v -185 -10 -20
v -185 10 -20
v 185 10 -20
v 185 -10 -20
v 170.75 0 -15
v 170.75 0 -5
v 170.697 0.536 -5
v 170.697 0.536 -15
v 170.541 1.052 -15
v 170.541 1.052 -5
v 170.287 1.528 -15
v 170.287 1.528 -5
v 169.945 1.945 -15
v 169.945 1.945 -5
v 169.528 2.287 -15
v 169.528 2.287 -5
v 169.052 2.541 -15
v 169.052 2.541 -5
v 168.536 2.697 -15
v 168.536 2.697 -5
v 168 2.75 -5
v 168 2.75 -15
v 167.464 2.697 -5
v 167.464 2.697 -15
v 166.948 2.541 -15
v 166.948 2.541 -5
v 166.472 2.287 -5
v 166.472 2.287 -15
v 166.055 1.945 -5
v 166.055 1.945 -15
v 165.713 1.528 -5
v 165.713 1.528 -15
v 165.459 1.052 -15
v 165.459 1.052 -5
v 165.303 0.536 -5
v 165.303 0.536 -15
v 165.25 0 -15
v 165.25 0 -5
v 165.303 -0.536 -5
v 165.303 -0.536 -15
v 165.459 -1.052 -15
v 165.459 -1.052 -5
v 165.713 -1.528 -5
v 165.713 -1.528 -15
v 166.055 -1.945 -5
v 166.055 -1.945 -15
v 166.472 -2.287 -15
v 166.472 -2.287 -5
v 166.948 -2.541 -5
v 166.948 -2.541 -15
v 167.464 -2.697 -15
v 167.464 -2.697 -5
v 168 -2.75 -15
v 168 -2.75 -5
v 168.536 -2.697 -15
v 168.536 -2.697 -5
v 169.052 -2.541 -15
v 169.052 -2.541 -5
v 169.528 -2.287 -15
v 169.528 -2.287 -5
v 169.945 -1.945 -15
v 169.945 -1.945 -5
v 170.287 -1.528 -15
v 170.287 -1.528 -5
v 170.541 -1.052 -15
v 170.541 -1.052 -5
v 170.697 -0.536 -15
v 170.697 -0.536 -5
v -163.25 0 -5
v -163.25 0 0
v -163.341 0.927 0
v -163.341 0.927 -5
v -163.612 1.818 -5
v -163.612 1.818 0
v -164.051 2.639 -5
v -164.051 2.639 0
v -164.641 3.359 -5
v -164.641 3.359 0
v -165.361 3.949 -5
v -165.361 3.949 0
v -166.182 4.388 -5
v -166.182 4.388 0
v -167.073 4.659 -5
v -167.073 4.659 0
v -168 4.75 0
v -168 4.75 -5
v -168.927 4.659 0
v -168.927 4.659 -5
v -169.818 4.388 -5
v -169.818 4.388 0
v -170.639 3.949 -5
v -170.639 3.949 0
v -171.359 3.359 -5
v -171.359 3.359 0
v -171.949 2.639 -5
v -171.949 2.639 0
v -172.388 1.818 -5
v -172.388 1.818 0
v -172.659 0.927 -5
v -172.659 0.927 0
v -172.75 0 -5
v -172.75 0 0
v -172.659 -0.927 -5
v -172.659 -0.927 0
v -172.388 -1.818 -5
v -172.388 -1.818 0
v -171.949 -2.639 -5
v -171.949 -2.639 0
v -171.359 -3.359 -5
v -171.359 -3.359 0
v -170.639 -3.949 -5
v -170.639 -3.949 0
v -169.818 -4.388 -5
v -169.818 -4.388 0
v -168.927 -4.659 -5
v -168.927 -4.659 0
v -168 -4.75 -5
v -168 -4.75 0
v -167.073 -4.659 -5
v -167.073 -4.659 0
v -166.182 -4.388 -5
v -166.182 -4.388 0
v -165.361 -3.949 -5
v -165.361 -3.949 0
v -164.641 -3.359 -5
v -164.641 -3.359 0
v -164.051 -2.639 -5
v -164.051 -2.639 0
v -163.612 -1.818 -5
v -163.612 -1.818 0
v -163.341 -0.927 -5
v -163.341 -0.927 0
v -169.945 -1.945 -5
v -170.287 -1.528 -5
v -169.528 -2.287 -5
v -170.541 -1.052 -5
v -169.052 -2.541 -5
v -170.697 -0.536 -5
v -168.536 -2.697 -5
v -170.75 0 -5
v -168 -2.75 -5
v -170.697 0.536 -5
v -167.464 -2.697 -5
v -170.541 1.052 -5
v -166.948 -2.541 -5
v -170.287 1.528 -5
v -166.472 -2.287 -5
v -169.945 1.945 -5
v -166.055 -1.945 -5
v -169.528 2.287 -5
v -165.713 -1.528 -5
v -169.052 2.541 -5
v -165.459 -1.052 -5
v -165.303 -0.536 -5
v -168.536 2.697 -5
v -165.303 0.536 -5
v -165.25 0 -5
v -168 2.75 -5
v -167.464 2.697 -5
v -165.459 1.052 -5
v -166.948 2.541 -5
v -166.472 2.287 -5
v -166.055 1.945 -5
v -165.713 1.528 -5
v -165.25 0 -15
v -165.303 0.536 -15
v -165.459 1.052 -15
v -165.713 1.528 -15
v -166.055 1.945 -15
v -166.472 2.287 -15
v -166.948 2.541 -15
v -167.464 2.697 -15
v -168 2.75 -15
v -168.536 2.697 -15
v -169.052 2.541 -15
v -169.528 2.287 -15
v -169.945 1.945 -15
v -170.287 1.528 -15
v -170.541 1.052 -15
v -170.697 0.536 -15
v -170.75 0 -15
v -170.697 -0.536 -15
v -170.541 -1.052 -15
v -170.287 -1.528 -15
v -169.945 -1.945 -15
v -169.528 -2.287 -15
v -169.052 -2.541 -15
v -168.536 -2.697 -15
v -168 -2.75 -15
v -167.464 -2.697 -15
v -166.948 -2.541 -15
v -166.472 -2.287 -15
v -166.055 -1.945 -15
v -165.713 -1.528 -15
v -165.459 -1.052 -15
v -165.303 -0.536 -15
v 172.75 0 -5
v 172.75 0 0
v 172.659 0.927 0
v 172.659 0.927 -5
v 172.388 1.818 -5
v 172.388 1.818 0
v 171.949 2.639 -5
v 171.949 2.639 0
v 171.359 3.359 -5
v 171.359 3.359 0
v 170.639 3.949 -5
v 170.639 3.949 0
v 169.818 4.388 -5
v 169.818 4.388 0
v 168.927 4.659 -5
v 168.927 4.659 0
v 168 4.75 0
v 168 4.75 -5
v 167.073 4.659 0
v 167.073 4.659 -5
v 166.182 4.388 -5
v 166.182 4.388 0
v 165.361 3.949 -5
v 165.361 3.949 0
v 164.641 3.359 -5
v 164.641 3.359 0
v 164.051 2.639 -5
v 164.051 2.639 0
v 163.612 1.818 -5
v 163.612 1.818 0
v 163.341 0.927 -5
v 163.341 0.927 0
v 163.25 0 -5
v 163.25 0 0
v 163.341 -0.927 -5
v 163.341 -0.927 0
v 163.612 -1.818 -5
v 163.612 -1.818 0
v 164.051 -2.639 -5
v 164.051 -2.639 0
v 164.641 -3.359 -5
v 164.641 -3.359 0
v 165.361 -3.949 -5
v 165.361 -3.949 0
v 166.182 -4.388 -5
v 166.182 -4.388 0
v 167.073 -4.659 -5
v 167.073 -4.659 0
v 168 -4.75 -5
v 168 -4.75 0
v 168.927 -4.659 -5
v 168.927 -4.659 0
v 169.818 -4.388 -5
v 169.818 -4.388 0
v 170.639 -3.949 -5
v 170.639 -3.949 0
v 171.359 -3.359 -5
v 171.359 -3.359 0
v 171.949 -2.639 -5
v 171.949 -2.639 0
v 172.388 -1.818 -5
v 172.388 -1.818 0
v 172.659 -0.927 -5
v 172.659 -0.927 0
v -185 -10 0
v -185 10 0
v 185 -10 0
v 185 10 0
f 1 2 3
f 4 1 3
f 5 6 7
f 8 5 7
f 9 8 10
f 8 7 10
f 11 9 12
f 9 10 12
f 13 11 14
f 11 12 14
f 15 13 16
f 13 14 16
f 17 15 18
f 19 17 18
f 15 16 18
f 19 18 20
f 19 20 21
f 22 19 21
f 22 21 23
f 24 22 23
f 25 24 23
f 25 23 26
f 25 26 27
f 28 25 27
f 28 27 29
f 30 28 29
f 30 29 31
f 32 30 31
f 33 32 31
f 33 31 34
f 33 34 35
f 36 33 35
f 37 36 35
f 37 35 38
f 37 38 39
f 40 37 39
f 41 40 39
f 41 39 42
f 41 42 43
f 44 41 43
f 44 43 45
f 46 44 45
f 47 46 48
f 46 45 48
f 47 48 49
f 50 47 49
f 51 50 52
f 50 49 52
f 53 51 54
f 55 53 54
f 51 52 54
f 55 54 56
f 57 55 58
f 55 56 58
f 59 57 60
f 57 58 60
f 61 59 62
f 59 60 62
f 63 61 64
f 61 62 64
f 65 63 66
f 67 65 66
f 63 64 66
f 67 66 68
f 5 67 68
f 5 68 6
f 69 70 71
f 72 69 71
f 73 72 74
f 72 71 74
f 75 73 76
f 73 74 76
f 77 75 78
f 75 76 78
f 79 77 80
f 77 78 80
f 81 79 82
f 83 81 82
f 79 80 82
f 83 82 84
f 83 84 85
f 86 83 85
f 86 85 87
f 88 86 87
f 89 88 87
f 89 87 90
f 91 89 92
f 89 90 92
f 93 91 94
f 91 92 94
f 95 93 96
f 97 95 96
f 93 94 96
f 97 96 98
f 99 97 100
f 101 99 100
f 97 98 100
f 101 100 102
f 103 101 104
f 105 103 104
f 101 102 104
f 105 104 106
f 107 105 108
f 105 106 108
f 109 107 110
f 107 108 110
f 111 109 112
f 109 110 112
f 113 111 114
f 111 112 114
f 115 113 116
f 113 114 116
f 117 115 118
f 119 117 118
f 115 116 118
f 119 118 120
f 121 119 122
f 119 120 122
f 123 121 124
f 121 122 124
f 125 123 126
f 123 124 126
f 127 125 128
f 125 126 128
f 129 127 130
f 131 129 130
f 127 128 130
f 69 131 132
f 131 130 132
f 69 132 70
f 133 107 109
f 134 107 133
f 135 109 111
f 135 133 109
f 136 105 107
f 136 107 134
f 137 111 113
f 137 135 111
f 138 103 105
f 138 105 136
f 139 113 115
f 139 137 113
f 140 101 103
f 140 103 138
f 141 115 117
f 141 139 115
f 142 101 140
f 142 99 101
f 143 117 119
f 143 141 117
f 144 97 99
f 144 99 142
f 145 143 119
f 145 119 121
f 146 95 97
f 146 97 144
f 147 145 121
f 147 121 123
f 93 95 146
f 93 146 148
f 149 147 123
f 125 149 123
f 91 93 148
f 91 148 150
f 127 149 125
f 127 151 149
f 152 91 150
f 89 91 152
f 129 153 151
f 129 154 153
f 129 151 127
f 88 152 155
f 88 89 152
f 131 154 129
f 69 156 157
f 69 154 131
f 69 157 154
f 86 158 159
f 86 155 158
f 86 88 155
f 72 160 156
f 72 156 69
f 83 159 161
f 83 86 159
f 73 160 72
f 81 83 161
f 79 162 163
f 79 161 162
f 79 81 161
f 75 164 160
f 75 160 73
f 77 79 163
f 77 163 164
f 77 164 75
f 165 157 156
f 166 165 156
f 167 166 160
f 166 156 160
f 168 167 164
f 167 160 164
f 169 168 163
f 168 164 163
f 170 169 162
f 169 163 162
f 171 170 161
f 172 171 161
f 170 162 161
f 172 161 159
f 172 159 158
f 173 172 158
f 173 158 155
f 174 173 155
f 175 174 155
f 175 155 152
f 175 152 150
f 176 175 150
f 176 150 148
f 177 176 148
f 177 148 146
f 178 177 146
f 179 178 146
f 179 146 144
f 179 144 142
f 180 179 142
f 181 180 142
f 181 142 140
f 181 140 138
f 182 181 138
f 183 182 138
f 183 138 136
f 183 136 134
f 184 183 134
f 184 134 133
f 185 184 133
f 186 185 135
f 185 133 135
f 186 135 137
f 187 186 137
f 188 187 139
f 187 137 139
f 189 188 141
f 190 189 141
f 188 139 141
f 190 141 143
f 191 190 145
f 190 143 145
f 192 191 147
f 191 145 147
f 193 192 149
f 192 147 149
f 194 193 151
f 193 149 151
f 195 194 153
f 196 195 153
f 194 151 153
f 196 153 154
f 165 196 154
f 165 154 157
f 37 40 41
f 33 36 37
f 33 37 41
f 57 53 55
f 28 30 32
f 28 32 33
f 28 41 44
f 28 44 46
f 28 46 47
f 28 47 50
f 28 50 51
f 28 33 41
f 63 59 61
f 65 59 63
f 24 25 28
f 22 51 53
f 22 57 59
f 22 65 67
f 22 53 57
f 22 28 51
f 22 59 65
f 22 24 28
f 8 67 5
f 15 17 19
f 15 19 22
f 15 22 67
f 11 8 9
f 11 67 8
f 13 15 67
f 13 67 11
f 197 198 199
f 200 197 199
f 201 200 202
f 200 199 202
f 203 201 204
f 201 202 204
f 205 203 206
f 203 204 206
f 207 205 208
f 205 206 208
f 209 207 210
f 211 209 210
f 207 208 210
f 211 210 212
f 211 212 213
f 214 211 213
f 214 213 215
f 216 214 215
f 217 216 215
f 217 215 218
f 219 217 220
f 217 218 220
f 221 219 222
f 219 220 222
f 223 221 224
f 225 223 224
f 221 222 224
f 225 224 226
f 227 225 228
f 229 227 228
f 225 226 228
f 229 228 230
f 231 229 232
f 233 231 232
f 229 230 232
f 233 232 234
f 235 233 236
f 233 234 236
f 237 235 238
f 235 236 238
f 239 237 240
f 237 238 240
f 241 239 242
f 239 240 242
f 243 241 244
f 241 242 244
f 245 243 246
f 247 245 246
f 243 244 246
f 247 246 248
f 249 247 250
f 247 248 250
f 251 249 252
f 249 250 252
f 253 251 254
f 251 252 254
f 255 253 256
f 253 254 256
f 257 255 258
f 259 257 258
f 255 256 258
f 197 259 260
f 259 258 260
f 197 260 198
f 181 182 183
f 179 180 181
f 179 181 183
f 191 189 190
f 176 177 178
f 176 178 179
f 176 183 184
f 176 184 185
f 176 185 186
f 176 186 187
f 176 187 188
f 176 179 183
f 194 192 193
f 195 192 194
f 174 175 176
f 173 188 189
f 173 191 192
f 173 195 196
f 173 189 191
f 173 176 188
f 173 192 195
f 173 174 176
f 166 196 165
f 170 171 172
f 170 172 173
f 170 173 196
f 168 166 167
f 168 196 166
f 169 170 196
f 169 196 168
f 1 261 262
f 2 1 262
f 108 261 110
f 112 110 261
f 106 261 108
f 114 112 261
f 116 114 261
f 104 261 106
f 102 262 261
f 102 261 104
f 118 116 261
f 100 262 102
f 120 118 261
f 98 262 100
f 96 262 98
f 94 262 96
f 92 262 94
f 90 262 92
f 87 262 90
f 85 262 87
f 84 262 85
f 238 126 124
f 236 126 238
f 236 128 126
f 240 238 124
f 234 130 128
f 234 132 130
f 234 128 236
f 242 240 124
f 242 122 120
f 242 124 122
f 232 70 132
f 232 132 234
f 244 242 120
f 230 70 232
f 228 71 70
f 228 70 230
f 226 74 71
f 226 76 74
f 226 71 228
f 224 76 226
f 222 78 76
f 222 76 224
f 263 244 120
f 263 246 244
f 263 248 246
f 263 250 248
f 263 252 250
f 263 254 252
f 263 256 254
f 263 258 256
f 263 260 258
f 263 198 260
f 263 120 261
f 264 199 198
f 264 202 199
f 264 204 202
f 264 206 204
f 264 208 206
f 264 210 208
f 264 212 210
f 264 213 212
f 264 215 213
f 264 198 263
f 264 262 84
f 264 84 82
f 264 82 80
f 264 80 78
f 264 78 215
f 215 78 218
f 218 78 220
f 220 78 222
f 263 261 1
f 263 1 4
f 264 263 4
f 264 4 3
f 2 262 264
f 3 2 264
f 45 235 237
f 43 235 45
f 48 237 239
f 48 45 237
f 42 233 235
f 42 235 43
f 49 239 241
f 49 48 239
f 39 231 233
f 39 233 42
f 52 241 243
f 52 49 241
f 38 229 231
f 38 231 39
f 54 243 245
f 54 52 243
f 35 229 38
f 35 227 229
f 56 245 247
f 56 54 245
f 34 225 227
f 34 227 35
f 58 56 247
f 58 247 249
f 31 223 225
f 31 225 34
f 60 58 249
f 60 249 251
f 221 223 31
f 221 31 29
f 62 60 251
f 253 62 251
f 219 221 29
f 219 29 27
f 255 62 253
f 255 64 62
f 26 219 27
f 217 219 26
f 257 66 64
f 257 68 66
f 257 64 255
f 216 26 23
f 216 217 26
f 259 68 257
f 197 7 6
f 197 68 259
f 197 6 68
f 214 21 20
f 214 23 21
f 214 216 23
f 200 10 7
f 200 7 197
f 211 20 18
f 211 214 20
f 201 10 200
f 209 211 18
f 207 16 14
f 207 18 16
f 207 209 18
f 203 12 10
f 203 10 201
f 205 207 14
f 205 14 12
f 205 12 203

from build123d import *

# Parameters (mm, degrees)
SKETCH_W        = 370
SKETCH_H        = 20
PAD_DEPTH       = 20
SKETCH001_R     = 4.75
POCKET_DEPTH    = 5
SKETCH002_R     = 2.75
POCKET001_DEPTH = 15


with BuildPart() as part:
    # Sketch → Pad (new body)
    with BuildSketch(Plane.XY):
        Rectangle(SKETCH_W, SKETCH_H)
    extrude(amount=-PAD_DEPTH)

    # Sketch001 (on Face5 of Pad) → Pocket (cut)
    with BuildSketch(Plane.XY):
        with Locations((168, 0)):
            Circle(SKETCH001_R)
        with Locations((-168, 0)):
            Circle(SKETCH001_R)
    extrude(amount=-POCKET_DEPTH, mode=Mode.SUBTRACT)

    # Sketch002 (on Face4 of Pocket) → Pocket001 (cut)
    with BuildSketch(Plane.XY):
        with Locations((-168, 0)):
            Circle(SKETCH002_R)
        with Locations((168, 0)):
            Circle(SKETCH002_R)
    extrude(amount=-POCKET001_DEPTH, mode=Mode.SUBTRACT)


solid = part.part
